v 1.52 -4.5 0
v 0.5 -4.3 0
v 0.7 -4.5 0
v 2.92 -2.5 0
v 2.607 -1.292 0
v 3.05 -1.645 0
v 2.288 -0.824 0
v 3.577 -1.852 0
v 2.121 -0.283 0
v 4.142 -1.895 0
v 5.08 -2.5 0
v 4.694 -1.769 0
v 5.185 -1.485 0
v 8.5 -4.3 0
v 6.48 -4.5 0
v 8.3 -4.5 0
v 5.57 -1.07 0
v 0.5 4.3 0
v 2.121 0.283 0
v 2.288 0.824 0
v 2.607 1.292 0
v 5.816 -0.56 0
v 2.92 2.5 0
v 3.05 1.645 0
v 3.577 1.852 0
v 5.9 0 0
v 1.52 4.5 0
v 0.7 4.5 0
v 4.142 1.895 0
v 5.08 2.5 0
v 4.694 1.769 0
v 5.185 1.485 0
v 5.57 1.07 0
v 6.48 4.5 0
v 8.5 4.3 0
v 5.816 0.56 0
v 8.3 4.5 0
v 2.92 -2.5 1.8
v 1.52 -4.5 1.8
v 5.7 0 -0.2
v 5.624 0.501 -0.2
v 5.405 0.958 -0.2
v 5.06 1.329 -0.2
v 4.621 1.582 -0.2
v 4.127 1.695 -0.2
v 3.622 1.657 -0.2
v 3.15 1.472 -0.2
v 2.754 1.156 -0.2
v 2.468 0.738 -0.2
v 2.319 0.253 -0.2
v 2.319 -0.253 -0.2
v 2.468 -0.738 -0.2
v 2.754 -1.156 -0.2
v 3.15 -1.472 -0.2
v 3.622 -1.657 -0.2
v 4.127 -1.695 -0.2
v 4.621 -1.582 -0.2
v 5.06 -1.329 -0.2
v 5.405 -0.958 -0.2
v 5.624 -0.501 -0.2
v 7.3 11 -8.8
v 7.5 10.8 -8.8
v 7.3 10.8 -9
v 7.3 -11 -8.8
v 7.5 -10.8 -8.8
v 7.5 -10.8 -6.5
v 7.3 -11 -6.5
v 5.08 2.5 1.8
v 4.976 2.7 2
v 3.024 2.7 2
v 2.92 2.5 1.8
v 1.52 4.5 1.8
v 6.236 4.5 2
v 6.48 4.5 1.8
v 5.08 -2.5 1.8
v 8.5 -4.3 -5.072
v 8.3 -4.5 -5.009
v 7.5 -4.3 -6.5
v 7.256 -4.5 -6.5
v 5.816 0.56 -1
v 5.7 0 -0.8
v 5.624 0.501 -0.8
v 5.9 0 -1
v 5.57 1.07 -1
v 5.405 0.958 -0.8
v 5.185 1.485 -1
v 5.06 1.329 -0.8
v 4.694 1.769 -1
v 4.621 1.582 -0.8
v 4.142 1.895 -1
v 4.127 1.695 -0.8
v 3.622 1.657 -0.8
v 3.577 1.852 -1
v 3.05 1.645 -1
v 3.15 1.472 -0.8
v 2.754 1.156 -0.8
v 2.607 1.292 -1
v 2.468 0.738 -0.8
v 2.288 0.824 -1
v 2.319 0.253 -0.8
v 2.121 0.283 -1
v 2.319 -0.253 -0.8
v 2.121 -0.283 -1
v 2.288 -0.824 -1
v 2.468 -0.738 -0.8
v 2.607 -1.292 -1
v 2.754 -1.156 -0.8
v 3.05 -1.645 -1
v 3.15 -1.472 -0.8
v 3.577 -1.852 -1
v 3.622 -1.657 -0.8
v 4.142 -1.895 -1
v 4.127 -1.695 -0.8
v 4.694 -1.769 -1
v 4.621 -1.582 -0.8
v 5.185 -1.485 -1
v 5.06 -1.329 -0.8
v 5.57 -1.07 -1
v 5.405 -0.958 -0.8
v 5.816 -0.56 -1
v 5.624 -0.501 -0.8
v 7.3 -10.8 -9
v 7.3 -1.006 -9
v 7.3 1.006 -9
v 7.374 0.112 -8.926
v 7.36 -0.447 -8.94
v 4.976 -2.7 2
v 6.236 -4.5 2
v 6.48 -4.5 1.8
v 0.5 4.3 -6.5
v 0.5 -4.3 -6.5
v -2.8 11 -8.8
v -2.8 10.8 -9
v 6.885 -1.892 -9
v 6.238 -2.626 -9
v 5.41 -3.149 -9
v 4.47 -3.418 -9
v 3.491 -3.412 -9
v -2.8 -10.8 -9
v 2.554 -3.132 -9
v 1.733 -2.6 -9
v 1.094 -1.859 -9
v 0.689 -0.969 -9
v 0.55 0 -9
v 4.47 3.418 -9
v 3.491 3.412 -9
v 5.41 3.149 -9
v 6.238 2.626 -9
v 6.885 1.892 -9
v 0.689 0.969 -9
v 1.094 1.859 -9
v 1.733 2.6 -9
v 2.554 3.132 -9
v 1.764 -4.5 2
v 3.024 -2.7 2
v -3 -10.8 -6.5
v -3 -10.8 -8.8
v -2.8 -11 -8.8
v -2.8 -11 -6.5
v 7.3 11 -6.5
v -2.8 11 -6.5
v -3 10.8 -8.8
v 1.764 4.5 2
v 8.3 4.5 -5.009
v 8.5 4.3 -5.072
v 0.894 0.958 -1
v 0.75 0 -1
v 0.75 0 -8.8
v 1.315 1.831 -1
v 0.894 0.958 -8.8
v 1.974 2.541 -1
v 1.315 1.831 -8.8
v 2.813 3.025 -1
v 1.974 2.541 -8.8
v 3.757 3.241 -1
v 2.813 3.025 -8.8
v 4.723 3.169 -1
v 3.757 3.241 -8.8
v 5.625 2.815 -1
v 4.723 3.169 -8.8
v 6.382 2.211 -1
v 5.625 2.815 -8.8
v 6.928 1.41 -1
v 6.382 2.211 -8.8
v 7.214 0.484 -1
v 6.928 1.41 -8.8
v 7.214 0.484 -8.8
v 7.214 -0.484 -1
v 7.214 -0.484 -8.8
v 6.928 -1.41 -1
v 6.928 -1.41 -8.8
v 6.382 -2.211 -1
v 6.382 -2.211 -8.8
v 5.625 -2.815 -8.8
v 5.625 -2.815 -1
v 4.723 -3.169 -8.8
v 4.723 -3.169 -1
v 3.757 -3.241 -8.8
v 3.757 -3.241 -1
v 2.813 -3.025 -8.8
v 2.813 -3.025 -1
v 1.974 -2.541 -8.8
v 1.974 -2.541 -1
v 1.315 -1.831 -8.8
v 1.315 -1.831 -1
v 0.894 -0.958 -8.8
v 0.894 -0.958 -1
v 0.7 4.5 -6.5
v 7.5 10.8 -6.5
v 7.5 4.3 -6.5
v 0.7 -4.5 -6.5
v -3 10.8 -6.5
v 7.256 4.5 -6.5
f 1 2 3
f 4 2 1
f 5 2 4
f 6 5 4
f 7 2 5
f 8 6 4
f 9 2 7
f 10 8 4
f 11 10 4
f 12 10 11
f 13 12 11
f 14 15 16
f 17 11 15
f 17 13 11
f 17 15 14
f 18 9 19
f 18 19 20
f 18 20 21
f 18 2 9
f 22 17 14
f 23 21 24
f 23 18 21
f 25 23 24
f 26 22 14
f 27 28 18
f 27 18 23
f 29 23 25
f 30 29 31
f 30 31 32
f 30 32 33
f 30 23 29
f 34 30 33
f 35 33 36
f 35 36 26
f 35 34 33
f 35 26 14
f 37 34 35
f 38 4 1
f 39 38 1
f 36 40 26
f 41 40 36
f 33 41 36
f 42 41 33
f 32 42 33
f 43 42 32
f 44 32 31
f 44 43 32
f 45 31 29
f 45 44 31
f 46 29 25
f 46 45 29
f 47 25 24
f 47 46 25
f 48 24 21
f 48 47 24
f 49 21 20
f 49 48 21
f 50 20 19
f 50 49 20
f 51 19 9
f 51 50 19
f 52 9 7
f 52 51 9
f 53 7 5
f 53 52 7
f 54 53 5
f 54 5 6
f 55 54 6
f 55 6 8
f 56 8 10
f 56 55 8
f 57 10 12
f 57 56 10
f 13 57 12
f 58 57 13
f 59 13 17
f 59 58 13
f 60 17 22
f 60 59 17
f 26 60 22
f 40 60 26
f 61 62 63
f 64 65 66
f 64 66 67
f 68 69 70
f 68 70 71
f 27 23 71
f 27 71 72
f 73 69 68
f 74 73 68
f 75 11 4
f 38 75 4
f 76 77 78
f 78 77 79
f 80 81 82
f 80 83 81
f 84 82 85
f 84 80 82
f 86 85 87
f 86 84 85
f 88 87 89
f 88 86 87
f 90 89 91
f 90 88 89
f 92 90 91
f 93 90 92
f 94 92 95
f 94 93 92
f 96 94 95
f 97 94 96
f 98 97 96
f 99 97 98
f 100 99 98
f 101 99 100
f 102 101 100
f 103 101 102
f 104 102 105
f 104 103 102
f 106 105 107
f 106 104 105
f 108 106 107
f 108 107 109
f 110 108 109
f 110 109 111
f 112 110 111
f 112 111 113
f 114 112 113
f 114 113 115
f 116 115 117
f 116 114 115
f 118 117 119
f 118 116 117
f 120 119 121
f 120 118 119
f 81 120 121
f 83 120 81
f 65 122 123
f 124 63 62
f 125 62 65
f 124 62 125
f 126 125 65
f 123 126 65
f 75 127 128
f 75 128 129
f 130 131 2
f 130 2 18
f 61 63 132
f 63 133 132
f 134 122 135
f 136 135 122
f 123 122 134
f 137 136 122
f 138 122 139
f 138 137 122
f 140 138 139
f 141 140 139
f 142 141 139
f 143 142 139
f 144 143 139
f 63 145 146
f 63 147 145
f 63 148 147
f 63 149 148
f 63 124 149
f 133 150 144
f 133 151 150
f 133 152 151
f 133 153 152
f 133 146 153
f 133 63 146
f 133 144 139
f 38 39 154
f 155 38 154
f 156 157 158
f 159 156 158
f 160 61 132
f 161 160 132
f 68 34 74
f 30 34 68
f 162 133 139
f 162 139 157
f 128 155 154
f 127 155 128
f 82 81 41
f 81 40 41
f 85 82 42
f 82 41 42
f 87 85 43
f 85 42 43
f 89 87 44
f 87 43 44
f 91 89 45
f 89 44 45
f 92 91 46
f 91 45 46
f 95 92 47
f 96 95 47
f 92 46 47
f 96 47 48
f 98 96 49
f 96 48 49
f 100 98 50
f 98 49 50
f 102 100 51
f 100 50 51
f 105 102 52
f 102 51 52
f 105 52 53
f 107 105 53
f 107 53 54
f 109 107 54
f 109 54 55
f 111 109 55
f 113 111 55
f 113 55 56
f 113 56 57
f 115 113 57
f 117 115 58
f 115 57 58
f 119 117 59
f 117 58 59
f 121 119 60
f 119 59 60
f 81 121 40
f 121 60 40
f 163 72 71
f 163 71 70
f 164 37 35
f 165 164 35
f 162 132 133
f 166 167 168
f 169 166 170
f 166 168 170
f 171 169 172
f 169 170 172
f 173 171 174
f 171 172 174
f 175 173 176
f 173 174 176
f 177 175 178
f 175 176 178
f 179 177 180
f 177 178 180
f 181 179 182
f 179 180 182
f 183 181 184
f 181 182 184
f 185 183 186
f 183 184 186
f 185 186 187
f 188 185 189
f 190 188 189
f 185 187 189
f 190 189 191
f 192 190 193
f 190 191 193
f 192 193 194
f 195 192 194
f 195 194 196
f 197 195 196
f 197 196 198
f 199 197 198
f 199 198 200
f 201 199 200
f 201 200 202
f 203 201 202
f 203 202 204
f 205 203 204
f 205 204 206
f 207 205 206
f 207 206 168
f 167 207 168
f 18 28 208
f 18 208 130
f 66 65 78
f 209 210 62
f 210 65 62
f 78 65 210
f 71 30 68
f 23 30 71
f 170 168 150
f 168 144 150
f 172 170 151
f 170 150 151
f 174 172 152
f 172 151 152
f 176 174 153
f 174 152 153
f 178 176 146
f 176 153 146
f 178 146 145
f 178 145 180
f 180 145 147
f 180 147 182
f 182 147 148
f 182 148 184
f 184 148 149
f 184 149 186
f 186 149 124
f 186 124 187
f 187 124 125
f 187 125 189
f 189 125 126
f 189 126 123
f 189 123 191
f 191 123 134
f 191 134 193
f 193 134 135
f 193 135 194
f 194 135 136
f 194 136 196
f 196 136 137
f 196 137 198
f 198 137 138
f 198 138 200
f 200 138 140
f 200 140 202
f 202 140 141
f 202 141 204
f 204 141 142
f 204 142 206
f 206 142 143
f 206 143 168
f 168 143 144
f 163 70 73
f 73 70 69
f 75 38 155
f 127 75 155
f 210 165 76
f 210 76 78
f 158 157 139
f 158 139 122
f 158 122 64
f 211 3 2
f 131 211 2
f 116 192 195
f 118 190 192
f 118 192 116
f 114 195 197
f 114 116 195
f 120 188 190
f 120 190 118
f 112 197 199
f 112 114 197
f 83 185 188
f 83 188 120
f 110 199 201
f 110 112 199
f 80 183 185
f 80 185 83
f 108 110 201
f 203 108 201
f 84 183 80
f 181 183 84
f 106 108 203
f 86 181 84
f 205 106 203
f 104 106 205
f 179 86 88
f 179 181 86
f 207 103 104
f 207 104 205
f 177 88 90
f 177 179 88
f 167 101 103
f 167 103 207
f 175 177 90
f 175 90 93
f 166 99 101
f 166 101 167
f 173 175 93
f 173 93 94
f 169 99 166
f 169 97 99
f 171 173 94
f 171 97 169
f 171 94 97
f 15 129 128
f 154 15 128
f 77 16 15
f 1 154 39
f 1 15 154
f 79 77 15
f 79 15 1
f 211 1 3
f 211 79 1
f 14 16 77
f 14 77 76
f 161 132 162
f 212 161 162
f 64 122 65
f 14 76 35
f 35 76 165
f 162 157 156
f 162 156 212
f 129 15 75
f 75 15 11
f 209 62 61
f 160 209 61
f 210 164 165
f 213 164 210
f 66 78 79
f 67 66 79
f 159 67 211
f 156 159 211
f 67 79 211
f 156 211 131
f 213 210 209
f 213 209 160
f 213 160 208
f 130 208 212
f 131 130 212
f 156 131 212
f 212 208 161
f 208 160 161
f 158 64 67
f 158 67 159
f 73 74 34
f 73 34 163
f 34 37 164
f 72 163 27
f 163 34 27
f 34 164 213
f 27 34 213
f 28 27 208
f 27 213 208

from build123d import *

# Parameters (mm, degrees)
BOSS_EXTRUDE1_DEPTH            = 4
SLOT_TAB_DEPTH                 = 2
CBORE_FOR_M3_SHCS2_D           = 3.4
CBORE_FOR_M3_SHCS2_CBORE_D     = 6.5
CBORE_FOR_M3_SHCS2_CBORE_DEPTH = 3
STOPPER_START                  = 2.5
SKETCH3_W                      = 8
SKETCH3_H                      = 9
SKETCH3_R                      = 3.25
STOPPER_CLEARANCE_DEPTH        = 2.5
SKETCH4_W                      = 10.5
SKETCH4_H                      = 22
SKETCH4_R                      = 3.25
STOPPER_DEPTH                  = 2.5
PRINT_CHAMFER_DEPTH            = 17.560495216
PRINT_CHAMFER_DEPTH_BACK       = 17.560495216
CHAMFER5_SIZE                  = 0.2


with BuildPart() as part:
    # Sketch1 → Boss-Extrude1 (new body)
    with BuildSketch(Plane.XY):
        Polygon((0.5, -4.5), (7.5, -4.5), (8.5, -4.5), (8.5, 4.5), (7.5, 4.5), (0.5, 4.5), align=None)
    extrude(amount=-BOSS_EXTRUDE1_DEPTH)

    # Sketch2 → Slot Tab (add)
    with BuildSketch(Plane.XY):
        Polygon((2.92028223, -2.5), (1.519867154, -4.5), (6.480132846, -4.5), (5.07971777, -2.5), align=None)
    slot_tab = extrude(amount=SLOT_TAB_DEPTH)

    # Slot Tabs: Slot Tab across plane
    add(slot_tab.mirror(Plane.ZX))

    # CBORE for M3 SHCS2 (through all)
    with Locations(Plane(origin=(0, 0, -4), x_dir=(-1, 0, 0), z_dir=(0, 0, -1))):
        with Locations((-4, 0)):
            CounterBoreHole(CBORE_FOR_M3_SHCS2_D / 2, CBORE_FOR_M3_SHCS2_CBORE_D / 2, CBORE_FOR_M3_SHCS2_CBORE_DEPTH)

    # Sketch3 → Stopper Clearance (add)
    with BuildSketch(Plane(origin=(0, 0, -4), x_dir=(-1, 0, 0), z_dir=(0, 0, -1)).offset(STOPPER_START)):
        with Locations((-4.5, 0)):
            Rectangle(SKETCH3_W, SKETCH3_H)
        with Locations((-4, 0)):
            Circle(SKETCH3_R, mode=Mode.SUBTRACT)
    extrude(amount=-STOPPER_CLEARANCE_DEPTH)

    # Sketch4 → Stopper (add)
    with BuildSketch(Plane(origin=(0, 0, -6.5), x_dir=(-1, 0, 0), z_dir=(0, 0, -1)).offset(STOPPER_START)):
        with Locations((-2.25, 0)):
            Rectangle(SKETCH4_W, SKETCH4_H)
        with Locations((-4, 0)):
            Circle(SKETCH4_R, mode=Mode.SUBTRACT)
    extrude(amount=-STOPPER_DEPTH)

    # Deburs With Stopper
    # the kernel refuses this chamfer: 0.2 mm, written as the material it takes off along each edge
    with BuildSketch(Plane(origin=(-2.866666667, -10.866666667, -8.866666667), x_dir=(-0.7071067811865491, 0, 0.707106781186546), z_dir=(-0.5773502691896235, -0.5773502691896274, -0.5773502691896262)), Plane(origin=(-2.866666667, 10.866666667, -8.866666667), x_dir=(1.5700924586837806e-15, 0.7071067811865476, 0.7071067811865476), z_dir=(-0.5773502691896244, 0.5773502691896271, -0.5773502691896257)), Plane(origin=(7.366666667, 10.866666667, -8.866666667), x_dir=(0.7071067811865491, 0, 0.707106781186546), z_dir=(0.5773502691896232, 0.5773502691896284, -0.5773502691896257))) as deburs_with_stopper_piece_1:
        Polygon((-0.141421356, 0.081649658), (0.141421356, 0.081649658), (0, -0.163299316), align=None)
    extrude(amount=0.254034118, mode=Mode.SUBTRACT)
    with BuildSketch(Plane(origin=(7.366666667, -10.866666667, -8.866666667), x_dir=(0.7071067811865491, 0, 0.707106781186546), z_dir=(0.5773502691896241, -0.5773502691896267, -0.5773502691896267))) as deburs_with_stopper_piece_2:
        Polygon((-0.141421356, -0.081649658), (0.141421356, -0.081649658), (0, 0.163299316), align=None)
    extrude(amount=0.254034118, mode=Mode.SUBTRACT)
    with BuildSketch(Plane(origin=(8.5, 4.5, -7.014336598), x_dir=(-0.9996219169112966, 0.02749587661058742, 0), z_dir=(0, 0, 1))) as deburs_with_stopper_piece_3:
        with BuildLine():
            Line((0.205734639, 0), (-0.011309431, 0.205423559))
            Line((-0.011309431, 0.205423559), (-0.015307919, 0.205313575))
            ThreePointArc((-0.015307919, 0.205313575), (-0.006825845, 0.102679566), (-0.003998488, -0.000109984))
            Line((-0.003998488, -0.000109984), (0.000109984, -0.003998488))
            ThreePointArc((0.000109984, -0.003998488), (0.102899533, -0.00117113), (0.205844623, -0.003998488))
            Line((0.205844623, -0.003998488), (0.205734639, 0))
        make_face()
    extrude(amount=7.528673195, mode=Mode.SUBTRACT)
    with BuildSketch(Plane(origin=(8.5, -4.5, -7.014336598), x_dir=(-0.9996219169112966, -0.02749587661058742, 0), z_dir=(0, 0, 1))) as deburs_with_stopper_piece_4:
        with BuildLine():
            Line((0.205734639, 0), (-0.011309431, -0.205423559))
            Line((-0.011309431, -0.205423559), (-0.015307919, -0.205313575))
            ThreePointArc((-0.015307919, -0.205313575), (-0.006825845, -0.102679566), (-0.003998488, 0.000109984))
            Line((-0.003998488, 0.000109984), (0.000109984, 0.003998488))
            ThreePointArc((0.000109984, 0.003998488), (0.102899533, 0.00117113), (0.205844623, 0.003998488))
            Line((0.205844623, 0.003998488), (0.205734639, 0))
        make_face()
    extrude(amount=7.528673195, mode=Mode.SUBTRACT)
    with BuildSketch(Plane(origin=(0.5, -4.5, 0.514336598), x_dir=(0.9996219169112966, -0.02749587661058736, 0), z_dir=(0, 0, -1))) as deburs_with_stopper_piece_5:
        with BuildLine():
            Line((0.205734639, 0), (-0.011309431, -0.205423559))
            Line((-0.011309431, -0.205423559), (-0.015307919, -0.205313575))
            ThreePointArc((-0.015307919, -0.205313575), (-0.006825845, -0.102679566), (-0.003998488, 0.000109984))
            Line((-0.003998488, 0.000109984), (0.000109984, 0.003998488))
            ThreePointArc((0.000109984, 0.003998488), (0.102899533, 0.00117113), (0.205844623, 0.003998488))
            Line((0.205844623, 0.003998488), (0.205734639, 0))
        make_face()
    extrude(amount=7.014336598, mode=Mode.SUBTRACT)
    with BuildSketch(Plane(origin=(0.5, 4.5, 0.514336598), x_dir=(0.9996219169112966, 0.02749587661058733, 0), z_dir=(0, 0, -1))) as deburs_with_stopper_piece_6:
        with BuildLine():
            Line((0.205734639, 0), (-0.011309431, 0.205423559))
            Line((-0.011309431, 0.205423559), (-0.015307919, 0.205313575))
            ThreePointArc((-0.015307919, 0.205313575), (-0.006825845, 0.102679566), (-0.003998488, -0.000109984))
            Line((-0.003998488, -0.000109984), (0.000109984, -0.003998488))
            ThreePointArc((0.000109984, -0.003998488), (0.102899533, -0.00117113), (0.205844623, -0.003998488))
            Line((0.205844623, -0.003998488), (0.205734639, 0))
        make_face()
    extrude(amount=7.014336598, mode=Mode.SUBTRACT)
    with BuildSketch(Plane(origin=(6.775144199, -4.921319875, 2), x_dir=(-0.8188423367539712, -0.5733595768003803, 0.02749587661058727), z_dir=(-0.5735764363510434, 0.8191520442889937, 0)), Plane(origin=(3.215293583, 2.078680125, 2), x_dir=(-0.02252330353507913, -0.015770986920647746, -0.9996219169112968), z_dir=(-0.5735764363510445, 0.8191520442889929, 0))) as deburs_with_stopper_piece_7:
        with BuildLine():
            Line((0.205734639, 0), (-0.011309431, -0.205423559))
            Line((-0.011309431, -0.205423559), (-0.015307919, -0.205313575))
            ThreePointArc((-0.015307919, -0.205313575), (-0.006825845, -0.102679566), (-0.003998488, 0.000109984))
            Line((-0.003998488, 0.000109984), (0.000109984, 0.003998488))
            ThreePointArc((0.000109984, 0.003998488), (0.102899533, 0.00117113), (0.205844623, 0.003998488))
            Line((0.205844623, 0.003998488), (0.205734639, 0))
        make_face()
    extrude(amount=3.470222373, mode=Mode.SUBTRACT)
    with BuildSketch(Plane(origin=(5.594054367, -2.5, 2), x_dir=(0, 0.02749587661058736, -0.9996219169112966), z_dir=(-1, 0, 0)), Plane(origin=(5.594054367, 2.5, 2), x_dir=(0, 0.9996219169112966, 0.027495876610587302), z_dir=(-1, 0, 0))) as deburs_with_stopper_piece_8:
        with BuildLine():
            Line((0.205734639, 0), (-0.011309431, 0.205423559))
            Line((-0.011309431, 0.205423559), (-0.015307919, 0.205313575))
            ThreePointArc((-0.015307919, 0.205313575), (-0.006825845, 0.102679566), (-0.003998488, -0.000109984))
            Line((-0.003998488, -0.000109984), (0.000109984, -0.003998488))
            ThreePointArc((0.000109984, -0.003998488), (0.102899533, -0.00117113), (0.205844623, -0.003998488))
            Line((0.205844623, -0.003998488), (0.205734639, 0))
        make_face()
    extrude(amount=3.188108734, mode=Mode.SUBTRACT)
    with BuildSketch(Plane(origin=(3.215293583, -2.078680125, 2), x_dir=(-0.02252330353507913, 0.015770986920647746, -0.9996219169112968), z_dir=(-0.5735764363510445, -0.8191520442889929, 0)), Plane(origin=(6.775144199, 4.921319875, 2), x_dir=(-0.8188423367539712, 0.5733595768003803, 0.02749587661058727), z_dir=(-0.5735764363510434, -0.8191520442889937, 0))) as deburs_with_stopper_piece_9:
        with BuildLine():
            Line((0.205734639, 0), (-0.011309431, 0.205423559))
            Line((-0.011309431, 0.205423559), (-0.015307919, 0.205313575))
            ThreePointArc((-0.015307919, 0.205313575), (-0.006825845, 0.102679566), (-0.003998488, -0.000109984))
            Line((-0.003998488, -0.000109984), (0.000109984, -0.003998488))
            ThreePointArc((0.000109984, -0.003998488), (0.102899533, -0.00117113), (0.205844623, -0.003998488))
            Line((0.205844623, -0.003998488), (0.205734639, 0))
        make_face()
    extrude(amount=3.470222373, mode=Mode.SUBTRACT)
    with BuildSketch(Plane(origin=(4, 0, 0), x_dir=(1, 0, 0), z_dir=(0, -1, 0))) as deburs_with_stopper_piece_10:
        with BuildLine():
            Line((1.905656854, 0.005656854), (1.694343146, -0.205656854))
            Line((1.694343146, -0.205656854), (1.690343146, -0.205656854))
            ThreePointArc((1.690343146, -0.205656854), (1.696, -0.102828427), (1.696, 0))
            Line((1.696, 0), (1.7, 0.004))
            ThreePointArc((1.7, 0.004), (1.802828427, 0.004), (1.905656854, 0.009656854))
            Line((1.905656854, 0.009656854), (1.905656854, 0.005656854))
        make_face()
    revolve(axis=Axis((4, 0, 0), (0, 0, 1)), mode=Mode.SUBTRACT)
    with BuildSketch(Plane(origin=(4, 0, -1), x_dir=(1, 0, 0), z_dir=(0, -1, 0))) as deburs_with_stopper_piece_11:
        with BuildLine():
            Line((1.694343146, 0.205656854), (1.905656854, -0.005656854))
            Line((1.905656854, -0.005656854), (1.905656854, -0.009656854))
            ThreePointArc((1.905656854, -0.009656854), (1.802828427, -0.004), (1.7, -0.004))
            Line((1.7, -0.004), (1.696, 0))
            ThreePointArc((1.696, 0), (1.696, 0.102828427), (1.690343146, 0.205656854))
            Line((1.690343146, 0.205656854), (1.694343146, 0.205656854))
        make_face()
    revolve(axis=Axis((4, 0, -1), (0, 0, 1)), mode=Mode.SUBTRACT)
    with BuildSketch(Plane(origin=(-3, -11.514336598, -9), x_dir=(0.9996219169112966, 0, -0.027495876610587302), z_dir=(0, 1, 0)), Plane(origin=(7.5, 11.514336598, -9), x_dir=(-0.9996219169112966, 0, -0.02749587661058742), z_dir=(0, -1, 0))) as deburs_with_stopper_piece_12:
        with BuildLine():
            Line((0.205734639, 0), (-0.011309431, -0.205423559))
            Line((-0.011309431, -0.205423559), (-0.015307919, -0.205313575))
            ThreePointArc((-0.015307919, -0.205313575), (-0.006825845, -0.102679566), (-0.003998488, 0.000109984))
            Line((-0.003998488, 0.000109984), (0.000109984, 0.003998488))
            ThreePointArc((0.000109984, 0.003998488), (0.102899533, 0.00117113), (0.205844623, 0.003998488))
            Line((0.205844623, 0.003998488), (0.205734639, 0))
        make_face()
    extrude(amount=23.028673195, mode=Mode.SUBTRACT)
    with BuildSketch(Plane(origin=(-3.514336598, 11, -9), x_dir=(0, -0.9996219169112966, -0.02749587661058742), z_dir=(1, 0, 0)), Plane(origin=(8.014336598, -11, -9), x_dir=(0, 0.9996219169112966, -0.02749587661058742), z_dir=(-1, 0, 0))) as deburs_with_stopper_piece_13:
        with BuildLine():
            Line((0.205734639, 0), (-0.011309431, -0.205423559))
            Line((-0.011309431, -0.205423559), (-0.015307919, -0.205313575))
            ThreePointArc((-0.015307919, -0.205313575), (-0.006825845, -0.102679566), (-0.003998488, 0.000109984))
            Line((-0.003998488, 0.000109984), (0.000109984, 0.003998488))
            ThreePointArc((0.000109984, 0.003998488), (0.102899533, 0.00117113), (0.205844623, 0.003998488))
            Line((0.205844623, 0.003998488), (0.205734639, 0))
        make_face()
    extrude(amount=11.528673195, mode=Mode.SUBTRACT)
    with BuildSketch(Plane(origin=(-3, -11, -9.514336598), x_dir=(-0.02749587661058742, 0.9996219169112966, 0), z_dir=(0, 0, 1)), Plane(origin=(-3, 11, -9.514336598), x_dir=(0.9996219169112966, 0.027495876610587302, 0), z_dir=(0, 0, 1)), Plane(origin=(7.5, 11, -9.514336598), x_dir=(0.02749587661058742, -0.9996219169112966, 0), z_dir=(0, 0, 1))) as deburs_with_stopper_piece_14:
        with BuildLine():
            Line((0.205734639, 0), (-0.011309431, -0.205423559))
            Line((-0.011309431, -0.205423559), (-0.015307919, -0.205313575))
            ThreePointArc((-0.015307919, -0.205313575), (-0.006825845, -0.102679566), (-0.003998488, 0.000109984))
            Line((-0.003998488, 0.000109984), (0.000109984, 0.003998488))
            ThreePointArc((0.000109984, 0.003998488), (0.102899533, 0.00117113), (0.205844623, 0.003998488))
            Line((0.205844623, 0.003998488), (0.205734639, 0))
        make_face()
    extrude(amount=3.528673195, mode=Mode.SUBTRACT)
    with BuildSketch(Plane(origin=(7.5, -11, -9.514336598), x_dir=(0.02749587661058742, 0.9996219169112966, 0), z_dir=(0, 0, 1))) as deburs_with_stopper_piece_15:
        with BuildLine():
            Line((0.205734639, 0), (-0.011309431, 0.205423559))
            Line((-0.011309431, 0.205423559), (-0.015307919, 0.205313575))
            ThreePointArc((-0.015307919, 0.205313575), (-0.006825845, 0.102679566), (-0.003998488, -0.000109984))
            Line((-0.003998488, -0.000109984), (0.000109984, -0.003998488))
            ThreePointArc((0.000109984, -0.003998488), (0.102899533, -0.00117113), (0.205844623, -0.003998488))
            Line((0.205844623, -0.003998488), (0.205734639, 0))
        make_face()
    extrude(amount=3.528673195, mode=Mode.SUBTRACT)
    with BuildSketch(Plane(origin=(4, 0, -9), x_dir=(-1, 0, 0), z_dir=(0, -1, 0))) as deburs_with_stopper_piece_16:
        with BuildLine():
            Line((3.244343146, -0.205656854), (3.455656854, 0.005656854))
            Line((3.455656854, 0.005656854), (3.455656854, 0.009656854))
            ThreePointArc((3.455656854, 0.009656854), (3.352828427, 0.004), (3.25, 0.004))
            Line((3.25, 0.004), (3.246, 0))
            ThreePointArc((3.246, 0), (3.246, -0.102828427), (3.240343146, -0.205656854))
            Line((3.240343146, -0.205656854), (3.244343146, -0.205656854))
        make_face()
    revolve(axis=Axis((4, 0, -9), (0, 0, -1)), mode=Mode.SUBTRACT)

    # Sketch10 → Print Chamfer (cut, two sides: drawn at the far end of the back side and taken through both)
    with BuildSketch(Plane(origin=(0, 0, 0), x_dir=(1, 0, 0), z_dir=(0, 1, 0)).offset(-PRINT_CHAMFER_DEPTH_BACK)):
        Polygon((7.5, 6.5), (8.5, 6.5), (8.5, 5.071851993), align=None)
    extrude(amount=PRINT_CHAMFER_DEPTH + PRINT_CHAMFER_DEPTH_BACK, mode=Mode.SUBTRACT)

    # Chamfer5
    chamfer5_edges = [part.edges().sort_by_distance(p)[0] for p in [
        (7.9, 4.5, -5.928740797),
        (7.9, -4.5, -5.928740797),
    ]]
    chamfer(chamfer5_edges, length=CHAMFER5_SIZE)


solid = part.part
